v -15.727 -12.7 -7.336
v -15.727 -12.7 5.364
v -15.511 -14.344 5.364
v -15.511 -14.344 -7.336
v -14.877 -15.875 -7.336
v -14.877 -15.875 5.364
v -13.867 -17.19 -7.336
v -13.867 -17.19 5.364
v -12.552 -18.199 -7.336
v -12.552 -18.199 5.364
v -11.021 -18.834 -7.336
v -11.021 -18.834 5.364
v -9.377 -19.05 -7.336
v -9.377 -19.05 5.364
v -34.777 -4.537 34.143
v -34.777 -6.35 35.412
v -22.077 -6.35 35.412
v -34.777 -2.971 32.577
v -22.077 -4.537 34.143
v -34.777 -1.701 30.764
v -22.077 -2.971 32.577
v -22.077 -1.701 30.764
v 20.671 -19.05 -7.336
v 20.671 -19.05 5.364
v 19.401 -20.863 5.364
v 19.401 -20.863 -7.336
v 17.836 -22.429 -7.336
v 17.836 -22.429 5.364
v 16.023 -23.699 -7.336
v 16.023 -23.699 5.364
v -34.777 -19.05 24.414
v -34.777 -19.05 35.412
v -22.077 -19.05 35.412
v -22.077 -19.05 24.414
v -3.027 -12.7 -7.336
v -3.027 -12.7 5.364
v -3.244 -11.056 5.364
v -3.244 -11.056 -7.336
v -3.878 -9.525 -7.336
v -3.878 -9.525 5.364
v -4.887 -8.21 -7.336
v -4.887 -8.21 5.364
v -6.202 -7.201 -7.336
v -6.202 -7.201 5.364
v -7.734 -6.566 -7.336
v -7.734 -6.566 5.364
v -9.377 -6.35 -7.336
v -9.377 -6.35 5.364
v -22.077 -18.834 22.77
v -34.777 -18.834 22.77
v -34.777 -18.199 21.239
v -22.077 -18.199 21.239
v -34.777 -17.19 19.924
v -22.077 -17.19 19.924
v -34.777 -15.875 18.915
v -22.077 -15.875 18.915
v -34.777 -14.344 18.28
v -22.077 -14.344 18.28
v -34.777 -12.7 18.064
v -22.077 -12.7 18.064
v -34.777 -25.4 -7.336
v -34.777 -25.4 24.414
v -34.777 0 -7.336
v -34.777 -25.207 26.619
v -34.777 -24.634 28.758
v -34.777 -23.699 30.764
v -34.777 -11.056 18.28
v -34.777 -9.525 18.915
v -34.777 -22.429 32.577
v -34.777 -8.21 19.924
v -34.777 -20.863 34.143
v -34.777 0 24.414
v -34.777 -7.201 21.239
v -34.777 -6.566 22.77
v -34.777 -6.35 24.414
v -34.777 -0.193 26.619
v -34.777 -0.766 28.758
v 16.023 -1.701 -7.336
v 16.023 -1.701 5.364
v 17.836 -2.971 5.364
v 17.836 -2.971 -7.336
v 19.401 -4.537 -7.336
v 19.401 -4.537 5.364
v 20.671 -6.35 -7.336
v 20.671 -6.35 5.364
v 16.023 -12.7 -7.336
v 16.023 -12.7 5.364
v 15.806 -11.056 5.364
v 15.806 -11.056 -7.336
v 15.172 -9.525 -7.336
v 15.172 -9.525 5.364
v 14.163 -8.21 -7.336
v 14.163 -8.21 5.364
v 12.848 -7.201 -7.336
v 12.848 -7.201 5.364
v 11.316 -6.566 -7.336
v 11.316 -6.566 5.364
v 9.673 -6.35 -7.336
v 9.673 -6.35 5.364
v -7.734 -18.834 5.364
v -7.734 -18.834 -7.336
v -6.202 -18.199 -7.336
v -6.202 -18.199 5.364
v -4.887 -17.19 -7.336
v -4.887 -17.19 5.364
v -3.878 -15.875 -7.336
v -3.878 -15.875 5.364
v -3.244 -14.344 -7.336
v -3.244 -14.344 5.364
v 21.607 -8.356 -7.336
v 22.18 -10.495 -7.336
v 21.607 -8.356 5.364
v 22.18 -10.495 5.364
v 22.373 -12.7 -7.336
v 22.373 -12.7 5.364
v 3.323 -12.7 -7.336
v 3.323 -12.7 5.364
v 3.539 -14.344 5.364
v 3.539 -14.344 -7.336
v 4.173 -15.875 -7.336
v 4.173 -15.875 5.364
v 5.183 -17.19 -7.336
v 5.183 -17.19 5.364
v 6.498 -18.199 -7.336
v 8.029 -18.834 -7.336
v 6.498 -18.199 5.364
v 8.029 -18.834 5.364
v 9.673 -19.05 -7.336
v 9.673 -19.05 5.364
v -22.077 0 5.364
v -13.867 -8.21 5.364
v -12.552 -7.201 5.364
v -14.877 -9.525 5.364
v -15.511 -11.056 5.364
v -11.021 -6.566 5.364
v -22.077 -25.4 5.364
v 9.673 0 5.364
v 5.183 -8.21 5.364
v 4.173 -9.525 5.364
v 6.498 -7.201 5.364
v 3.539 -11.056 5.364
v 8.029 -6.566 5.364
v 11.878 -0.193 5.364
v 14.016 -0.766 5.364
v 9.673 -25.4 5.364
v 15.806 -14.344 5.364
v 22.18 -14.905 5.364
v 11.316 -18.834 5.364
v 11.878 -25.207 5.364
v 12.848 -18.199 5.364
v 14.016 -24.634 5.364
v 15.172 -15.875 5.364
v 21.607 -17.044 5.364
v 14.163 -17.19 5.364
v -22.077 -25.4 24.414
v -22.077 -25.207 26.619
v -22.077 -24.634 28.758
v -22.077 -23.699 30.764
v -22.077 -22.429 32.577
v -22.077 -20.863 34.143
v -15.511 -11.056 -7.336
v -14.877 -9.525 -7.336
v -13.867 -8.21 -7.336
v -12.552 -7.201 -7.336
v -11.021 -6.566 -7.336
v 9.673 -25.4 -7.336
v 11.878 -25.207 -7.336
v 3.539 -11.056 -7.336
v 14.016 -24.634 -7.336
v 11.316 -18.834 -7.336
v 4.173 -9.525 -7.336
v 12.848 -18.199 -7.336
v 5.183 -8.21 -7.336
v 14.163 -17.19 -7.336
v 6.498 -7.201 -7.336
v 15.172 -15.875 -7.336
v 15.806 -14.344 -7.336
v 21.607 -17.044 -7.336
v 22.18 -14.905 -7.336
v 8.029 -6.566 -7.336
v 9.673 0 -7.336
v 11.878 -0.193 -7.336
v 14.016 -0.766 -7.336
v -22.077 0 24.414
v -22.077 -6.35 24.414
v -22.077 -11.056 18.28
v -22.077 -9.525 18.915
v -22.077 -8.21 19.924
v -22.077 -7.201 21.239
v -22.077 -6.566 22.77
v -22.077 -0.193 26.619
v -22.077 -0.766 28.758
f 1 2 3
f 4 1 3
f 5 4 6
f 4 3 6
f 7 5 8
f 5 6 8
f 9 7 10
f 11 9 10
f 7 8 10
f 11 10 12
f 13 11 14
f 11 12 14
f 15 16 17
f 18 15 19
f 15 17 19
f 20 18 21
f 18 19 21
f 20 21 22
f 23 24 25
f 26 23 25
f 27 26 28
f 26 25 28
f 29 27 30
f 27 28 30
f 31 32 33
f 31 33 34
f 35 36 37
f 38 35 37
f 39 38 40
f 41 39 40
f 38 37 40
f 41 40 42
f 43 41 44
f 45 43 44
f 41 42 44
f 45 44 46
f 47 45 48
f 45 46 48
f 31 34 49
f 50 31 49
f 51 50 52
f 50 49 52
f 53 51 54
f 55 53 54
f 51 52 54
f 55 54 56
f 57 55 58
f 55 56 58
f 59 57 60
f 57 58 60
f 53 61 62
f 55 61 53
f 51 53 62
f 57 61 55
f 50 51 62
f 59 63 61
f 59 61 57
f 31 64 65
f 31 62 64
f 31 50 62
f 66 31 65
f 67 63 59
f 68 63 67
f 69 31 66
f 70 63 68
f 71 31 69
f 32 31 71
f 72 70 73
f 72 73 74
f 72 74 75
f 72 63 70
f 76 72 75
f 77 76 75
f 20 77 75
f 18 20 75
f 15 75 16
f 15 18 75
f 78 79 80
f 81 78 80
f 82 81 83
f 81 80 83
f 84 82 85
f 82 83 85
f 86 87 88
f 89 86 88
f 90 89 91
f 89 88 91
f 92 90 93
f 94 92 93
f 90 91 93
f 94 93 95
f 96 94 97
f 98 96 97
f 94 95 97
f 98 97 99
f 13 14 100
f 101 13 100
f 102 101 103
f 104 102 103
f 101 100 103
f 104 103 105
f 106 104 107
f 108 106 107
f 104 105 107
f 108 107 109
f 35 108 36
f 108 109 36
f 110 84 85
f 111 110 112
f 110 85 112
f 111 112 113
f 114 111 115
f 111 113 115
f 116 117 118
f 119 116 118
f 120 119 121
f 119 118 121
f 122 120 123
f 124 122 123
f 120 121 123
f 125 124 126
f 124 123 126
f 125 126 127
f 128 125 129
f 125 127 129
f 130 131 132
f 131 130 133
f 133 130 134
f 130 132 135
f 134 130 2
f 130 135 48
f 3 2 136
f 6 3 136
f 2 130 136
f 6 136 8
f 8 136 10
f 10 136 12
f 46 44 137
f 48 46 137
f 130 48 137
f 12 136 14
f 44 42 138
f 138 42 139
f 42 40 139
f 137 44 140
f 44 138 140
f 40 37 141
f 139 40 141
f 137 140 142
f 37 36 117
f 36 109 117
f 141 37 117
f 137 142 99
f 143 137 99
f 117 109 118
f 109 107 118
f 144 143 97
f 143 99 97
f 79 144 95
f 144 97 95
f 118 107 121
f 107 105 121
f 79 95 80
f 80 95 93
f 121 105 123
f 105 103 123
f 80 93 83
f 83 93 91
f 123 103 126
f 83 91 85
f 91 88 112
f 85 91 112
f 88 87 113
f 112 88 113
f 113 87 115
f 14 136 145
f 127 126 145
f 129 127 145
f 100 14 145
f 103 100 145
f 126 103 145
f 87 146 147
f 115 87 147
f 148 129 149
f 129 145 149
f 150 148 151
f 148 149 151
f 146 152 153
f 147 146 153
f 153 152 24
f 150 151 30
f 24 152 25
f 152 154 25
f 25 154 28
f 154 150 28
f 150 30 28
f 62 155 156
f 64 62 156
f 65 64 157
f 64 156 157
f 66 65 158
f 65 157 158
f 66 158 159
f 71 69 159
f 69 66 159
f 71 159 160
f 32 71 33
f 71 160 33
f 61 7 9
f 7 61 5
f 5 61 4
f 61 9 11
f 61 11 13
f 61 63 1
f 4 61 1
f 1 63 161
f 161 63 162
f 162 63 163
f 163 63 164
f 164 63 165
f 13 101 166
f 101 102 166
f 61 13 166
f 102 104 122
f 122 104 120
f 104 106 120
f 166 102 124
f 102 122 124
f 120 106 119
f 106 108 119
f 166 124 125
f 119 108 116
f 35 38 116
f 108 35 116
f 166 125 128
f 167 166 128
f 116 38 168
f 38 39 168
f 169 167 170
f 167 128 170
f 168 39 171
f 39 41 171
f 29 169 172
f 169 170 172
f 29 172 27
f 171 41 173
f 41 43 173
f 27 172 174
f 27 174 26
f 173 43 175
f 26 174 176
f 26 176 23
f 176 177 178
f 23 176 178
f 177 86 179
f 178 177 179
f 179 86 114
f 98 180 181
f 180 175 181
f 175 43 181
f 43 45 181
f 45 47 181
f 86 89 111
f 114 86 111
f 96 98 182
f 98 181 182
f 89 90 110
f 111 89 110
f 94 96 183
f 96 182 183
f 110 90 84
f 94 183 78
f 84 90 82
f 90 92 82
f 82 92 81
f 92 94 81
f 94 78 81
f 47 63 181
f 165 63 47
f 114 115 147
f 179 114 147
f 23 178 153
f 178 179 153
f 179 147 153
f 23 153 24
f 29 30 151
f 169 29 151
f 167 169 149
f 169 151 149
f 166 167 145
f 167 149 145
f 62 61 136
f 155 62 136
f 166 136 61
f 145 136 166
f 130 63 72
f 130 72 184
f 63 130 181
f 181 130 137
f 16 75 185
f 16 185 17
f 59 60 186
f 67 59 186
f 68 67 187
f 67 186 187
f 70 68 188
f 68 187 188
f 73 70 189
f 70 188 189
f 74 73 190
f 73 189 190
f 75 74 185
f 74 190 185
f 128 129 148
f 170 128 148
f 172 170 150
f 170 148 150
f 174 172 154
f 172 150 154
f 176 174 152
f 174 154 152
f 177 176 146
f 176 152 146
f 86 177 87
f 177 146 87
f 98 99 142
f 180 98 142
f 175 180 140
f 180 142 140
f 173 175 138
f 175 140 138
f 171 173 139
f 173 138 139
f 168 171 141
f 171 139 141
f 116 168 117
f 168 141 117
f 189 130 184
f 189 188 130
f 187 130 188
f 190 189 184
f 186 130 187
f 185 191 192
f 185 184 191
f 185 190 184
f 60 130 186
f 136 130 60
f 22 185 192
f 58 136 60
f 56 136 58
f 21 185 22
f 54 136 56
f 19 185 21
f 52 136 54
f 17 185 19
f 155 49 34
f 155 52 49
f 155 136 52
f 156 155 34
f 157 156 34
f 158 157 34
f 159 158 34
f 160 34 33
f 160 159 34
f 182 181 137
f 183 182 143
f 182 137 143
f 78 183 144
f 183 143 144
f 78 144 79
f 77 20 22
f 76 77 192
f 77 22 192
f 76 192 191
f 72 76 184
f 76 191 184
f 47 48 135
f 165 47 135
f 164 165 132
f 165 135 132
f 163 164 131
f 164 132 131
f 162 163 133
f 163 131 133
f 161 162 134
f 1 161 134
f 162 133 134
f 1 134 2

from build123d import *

# Parameters (mm, degrees)
F0_W     = 57.15
F0_H     = 44.45
F1_DEPTH = 25.4
F2_W     = 44.45
F2_H     = 31.75
F3_DEPTH = 25.401
F5_DEPTH = 12.701
F7_DEPTH = 25.4


with BuildPart() as f1:
    # F0 (on Front) → F1 (new body)
    with BuildSketch(Plane.XZ):
        with Locations((-6.2023242936, 14.8889736688)):
            Rectangle(F0_W, F0_H)
    extrude(amount=F1_DEPTH)

    # F2 (on face) → F3 (cut, through all)
    with BuildSketch(Plane.XZ.offset(25.4)):
        with Locations((0.1476757064, 21.2389736688)):
            Rectangle(F2_W, F2_H)
    extrude(amount=-F3_DEPTH, mode=Mode.SUBTRACT)

    # F4 (on face) → F5 (cut, through all)
    with BuildSketch(Plane.XY.offset(5.3639736688)):
        with BuildLine():
            ThreePointArc((16.0226757064, -12.7), (14.1628037685, -8.209871941), (9.6726757108, -6.35))
            Line((9.6726757064, -6.35), (9.6726757064, -12.7))
            Line((9.6726757064, -12.7), (9.6726757064, -19.05))
            ThreePointArc((9.6726757179, -19.05), (14.162803771, -17.1901280565), (16.0226757064, -12.7))
        make_face()
        with BuildLine():
            ThreePointArc((9.6726757108, -6.35), (5.1825476475, -8.2098719379), (3.3226757064, -12.7))
            ThreePointArc((3.3226757064, -12.7), (5.18254765, -17.1901280646), (9.6726757179, -19.05))
            Line((9.6726757064, -19.05), (9.6726757064, -12.7))
            Line((9.6726757064, -12.7), (9.6726757064, -6.35))
        make_face()
        with BuildLine():
            ThreePointArc((-9.3773242936, -6.35), (-13.8674523541, -8.2098719395), (-15.7273242936, -12.7))
            ThreePointArc((-15.7273242936, -12.7), (-13.8674523541, -17.1901280605), (-9.3773242936, -19.05))
            ThreePointArc((-9.3773242936, -19.05), (-4.887196233, -17.1901280605), (-3.0273242936, -12.7))
            ThreePointArc((-3.0273242936, -12.7), (-4.887196233, -8.2098719395), (-9.3773242936, -6.35))
        make_face()
        with BuildLine():
            Line((16.0226757064, 0), (16.0226757064, -1.7014773719))
            ThreePointArc((16.0226757064, -1.7014773719), (18.6529318275, -3.7197438789), (20.6711983345, -6.35))
            Line((20.6711983345, -6.35), (22.3726757064, -6.35))
            Line((22.3726757064, -6.35), (22.3726757064, 0))
            Line((22.3726757064, 0), (16.0226757064, 0))
        make_face()
        with BuildLine():
            Line((16.0226757064, 0), (9.6726757064, 0))
            ThreePointArc((9.6726757064, 0), (12.9596775792, -0.4327420061), (16.0226757064, -1.7014773719))
            Line((16.0226757064, -1.7014773719), (16.0226757064, 0))
        make_face()
        with BuildLine():
            Line((22.3726757064, -6.35), (20.6711983345, -6.35))
            ThreePointArc((20.6711983345, -6.35), (21.9399337003, -9.4129981272), (22.3726757064, -12.7))
            Line((22.3726757064, -12.7), (22.3726757064, -6.35))
        make_face()
        with BuildLine():
            Line((22.3726757064, -19.05), (22.3726757064, -12.7))
            ThreePointArc((22.3726757064, -12.7), (21.9399337003, -15.9870018728), (20.6711983345, -19.05))
            Line((20.6711983345, -19.05), (22.3726757064, -19.05))
        make_face()
        with BuildLine():
            ThreePointArc((20.6711983345, -19.05), (18.6529318275, -21.6802561211), (16.0226757064, -23.6985226281))
            Line((16.0226757064, -23.6985226281), (16.0226757064, -25.4))
            Line((16.0226757064, -25.4), (22.3726757064, -25.4))
            Line((22.3726757064, -25.4), (22.3726757064, -19.05))
            Line((22.3726757064, -19.05), (20.6711983345, -19.05))
        make_face()
        with BuildLine():
            ThreePointArc((16.0226757064, -23.6985226281), (12.9596775792, -24.9672579939), (9.6726757064, -25.4))
            Line((9.6726757064, -25.4), (16.0226757064, -25.4))
            Line((16.0226757064, -25.4), (16.0226757064, -23.6985226281))
        make_face()
    extrude(amount=-F5_DEPTH, mode=Mode.SUBTRACT)

    # F6 (on face) → F7 (cut)
    with BuildSketch(Plane.YZ.offset(-22.0773242936)):
        with BuildLine():
            Line((-19.05, 30.7639736688), (-19.05, 24.4139736688))
            ThreePointArc((-19.05, 24.4139736688), (-17.1901280605, 28.9041017294), (-12.7, 30.7639736688))
            Line((-12.7, 30.7639736688), (-19.05, 30.7639736688))
        make_face()
        with BuildLine():
            Line((-6.35, 30.7639736688), (-12.7, 30.7639736688))
            ThreePointArc((-12.7, 30.7639736688), (-8.2098719395, 28.9041017294), (-6.35, 24.4139736688))
            Line((-6.35, 24.4139736688), (-6.35, 30.7639736688))
        make_face()
        with BuildLine():
            ThreePointArc((-12.7, 30.7639736688), (-17.1901280605, 28.9041017294), (-19.05, 24.4139736688))
            Line((-19.05, 24.4139736688), (-12.7, 24.4139736688))
            Line((-12.7, 24.4139736688), (-6.35, 24.4139736688))
            ThreePointArc((-6.35, 24.4139736688), (-8.2098719395, 28.9041017294), (-12.7, 30.7639736688))
        make_face()
        with BuildLine():
            Line((-19.05, 35.4124962969), (-19.05, 30.7639736688))
            Line((-19.05, 30.7639736688), (-12.7, 30.7639736688))
            Line((-12.7, 30.7639736688), (-6.35, 30.7639736688))
            Line((-6.35, 30.7639736688), (-6.35, 35.4124962969))
            ThreePointArc((-6.35, 35.4124962969), (-9.4129981272, 36.6812316627), (-12.7, 37.1139736688))
            ThreePointArc((-12.7, 37.1139736688), (-15.9870018728, 36.6812316627), (-19.05, 35.4124962969))
        make_face()
        with BuildLine():
            ThreePointArc((-23.6985226281, 30.7639736688), (-21.6802561211, 33.3942297899), (-19.05, 35.4124962969))
            Line((-19.05, 35.4124962969), (-19.05, 37.1139736688))
            Line((-19.05, 37.1139736688), (-25.4, 37.1139736688))
            Line((-25.4, 37.1139736688), (-25.4, 30.7639736688))
            Line((-25.4, 30.7639736688), (-23.6985226281, 30.7639736688))
        make_face()
        with BuildLine():
            ThreePointArc((-1.7014773719, 30.7639736688), (-0.4327420061, 27.7009755416), (0, 24.4139736688))
            Line((0, 24.4139736688), (0, 30.7639736688))
            Line((0, 30.7639736688), (-1.7014773719, 30.7639736688))
        make_face()
        with BuildLine():
            Line((-25.4, 30.7639736688), (-25.4, 24.4139736688))
            ThreePointArc((-25.4, 24.4139736688), (-24.9672579939, 27.7009755416), (-23.6985226281, 30.7639736688))
            Line((-23.6985226281, 30.7639736688), (-25.4, 30.7639736688))
        make_face()
        with BuildLine():
            Line((-19.05, 37.1139736688), (-19.05, 35.4124962969))
            ThreePointArc((-19.05, 35.4124962969), (-15.9870018728, 36.6812316627), (-12.7, 37.1139736688))
            Line((-12.7, 37.1139736688), (-19.05, 37.1139736688))
        make_face()
        with BuildLine():
            Line((-6.35, 37.1139736688), (-12.7, 37.1139736688))
            ThreePointArc((-12.7, 37.1139736688), (-9.4129981272, 36.6812316627), (-6.35, 35.4124962969))
            Line((-6.35, 35.4124962969), (-6.35, 37.1139736688))
        make_face()
        with BuildLine():
            Line((-6.35, 37.1139736688), (-6.35, 35.4124962969))
            ThreePointArc((-6.35, 35.4124962969), (-3.7197438789, 33.3942297899), (-1.7014773719, 30.7639736688))
            Line((-1.7014773719, 30.7639736688), (0, 30.7639736688))
            Line((0, 30.7639736688), (0, 37.1139736688))
            Line((0, 37.1139736688), (-6.35, 37.1139736688))
        make_face()
        with BuildLine():
            Line((-12.7, 24.4139736688), (-19.05, 24.4139736688))
            ThreePointArc((-19.05, 24.4139736688), (-17.1901280605, 19.9238456083), (-12.7, 18.0639736688))
            ThreePointArc((-12.7, 18.0639736688), (-8.2098719395, 19.9238456083), (-6.35, 24.4139736688))
            Line((-6.35, 24.4139736688), (-12.7, 24.4139736688))
        make_face()
    extrude(amount=-F7_DEPTH, mode=Mode.SUBTRACT)


solid = f1.part
